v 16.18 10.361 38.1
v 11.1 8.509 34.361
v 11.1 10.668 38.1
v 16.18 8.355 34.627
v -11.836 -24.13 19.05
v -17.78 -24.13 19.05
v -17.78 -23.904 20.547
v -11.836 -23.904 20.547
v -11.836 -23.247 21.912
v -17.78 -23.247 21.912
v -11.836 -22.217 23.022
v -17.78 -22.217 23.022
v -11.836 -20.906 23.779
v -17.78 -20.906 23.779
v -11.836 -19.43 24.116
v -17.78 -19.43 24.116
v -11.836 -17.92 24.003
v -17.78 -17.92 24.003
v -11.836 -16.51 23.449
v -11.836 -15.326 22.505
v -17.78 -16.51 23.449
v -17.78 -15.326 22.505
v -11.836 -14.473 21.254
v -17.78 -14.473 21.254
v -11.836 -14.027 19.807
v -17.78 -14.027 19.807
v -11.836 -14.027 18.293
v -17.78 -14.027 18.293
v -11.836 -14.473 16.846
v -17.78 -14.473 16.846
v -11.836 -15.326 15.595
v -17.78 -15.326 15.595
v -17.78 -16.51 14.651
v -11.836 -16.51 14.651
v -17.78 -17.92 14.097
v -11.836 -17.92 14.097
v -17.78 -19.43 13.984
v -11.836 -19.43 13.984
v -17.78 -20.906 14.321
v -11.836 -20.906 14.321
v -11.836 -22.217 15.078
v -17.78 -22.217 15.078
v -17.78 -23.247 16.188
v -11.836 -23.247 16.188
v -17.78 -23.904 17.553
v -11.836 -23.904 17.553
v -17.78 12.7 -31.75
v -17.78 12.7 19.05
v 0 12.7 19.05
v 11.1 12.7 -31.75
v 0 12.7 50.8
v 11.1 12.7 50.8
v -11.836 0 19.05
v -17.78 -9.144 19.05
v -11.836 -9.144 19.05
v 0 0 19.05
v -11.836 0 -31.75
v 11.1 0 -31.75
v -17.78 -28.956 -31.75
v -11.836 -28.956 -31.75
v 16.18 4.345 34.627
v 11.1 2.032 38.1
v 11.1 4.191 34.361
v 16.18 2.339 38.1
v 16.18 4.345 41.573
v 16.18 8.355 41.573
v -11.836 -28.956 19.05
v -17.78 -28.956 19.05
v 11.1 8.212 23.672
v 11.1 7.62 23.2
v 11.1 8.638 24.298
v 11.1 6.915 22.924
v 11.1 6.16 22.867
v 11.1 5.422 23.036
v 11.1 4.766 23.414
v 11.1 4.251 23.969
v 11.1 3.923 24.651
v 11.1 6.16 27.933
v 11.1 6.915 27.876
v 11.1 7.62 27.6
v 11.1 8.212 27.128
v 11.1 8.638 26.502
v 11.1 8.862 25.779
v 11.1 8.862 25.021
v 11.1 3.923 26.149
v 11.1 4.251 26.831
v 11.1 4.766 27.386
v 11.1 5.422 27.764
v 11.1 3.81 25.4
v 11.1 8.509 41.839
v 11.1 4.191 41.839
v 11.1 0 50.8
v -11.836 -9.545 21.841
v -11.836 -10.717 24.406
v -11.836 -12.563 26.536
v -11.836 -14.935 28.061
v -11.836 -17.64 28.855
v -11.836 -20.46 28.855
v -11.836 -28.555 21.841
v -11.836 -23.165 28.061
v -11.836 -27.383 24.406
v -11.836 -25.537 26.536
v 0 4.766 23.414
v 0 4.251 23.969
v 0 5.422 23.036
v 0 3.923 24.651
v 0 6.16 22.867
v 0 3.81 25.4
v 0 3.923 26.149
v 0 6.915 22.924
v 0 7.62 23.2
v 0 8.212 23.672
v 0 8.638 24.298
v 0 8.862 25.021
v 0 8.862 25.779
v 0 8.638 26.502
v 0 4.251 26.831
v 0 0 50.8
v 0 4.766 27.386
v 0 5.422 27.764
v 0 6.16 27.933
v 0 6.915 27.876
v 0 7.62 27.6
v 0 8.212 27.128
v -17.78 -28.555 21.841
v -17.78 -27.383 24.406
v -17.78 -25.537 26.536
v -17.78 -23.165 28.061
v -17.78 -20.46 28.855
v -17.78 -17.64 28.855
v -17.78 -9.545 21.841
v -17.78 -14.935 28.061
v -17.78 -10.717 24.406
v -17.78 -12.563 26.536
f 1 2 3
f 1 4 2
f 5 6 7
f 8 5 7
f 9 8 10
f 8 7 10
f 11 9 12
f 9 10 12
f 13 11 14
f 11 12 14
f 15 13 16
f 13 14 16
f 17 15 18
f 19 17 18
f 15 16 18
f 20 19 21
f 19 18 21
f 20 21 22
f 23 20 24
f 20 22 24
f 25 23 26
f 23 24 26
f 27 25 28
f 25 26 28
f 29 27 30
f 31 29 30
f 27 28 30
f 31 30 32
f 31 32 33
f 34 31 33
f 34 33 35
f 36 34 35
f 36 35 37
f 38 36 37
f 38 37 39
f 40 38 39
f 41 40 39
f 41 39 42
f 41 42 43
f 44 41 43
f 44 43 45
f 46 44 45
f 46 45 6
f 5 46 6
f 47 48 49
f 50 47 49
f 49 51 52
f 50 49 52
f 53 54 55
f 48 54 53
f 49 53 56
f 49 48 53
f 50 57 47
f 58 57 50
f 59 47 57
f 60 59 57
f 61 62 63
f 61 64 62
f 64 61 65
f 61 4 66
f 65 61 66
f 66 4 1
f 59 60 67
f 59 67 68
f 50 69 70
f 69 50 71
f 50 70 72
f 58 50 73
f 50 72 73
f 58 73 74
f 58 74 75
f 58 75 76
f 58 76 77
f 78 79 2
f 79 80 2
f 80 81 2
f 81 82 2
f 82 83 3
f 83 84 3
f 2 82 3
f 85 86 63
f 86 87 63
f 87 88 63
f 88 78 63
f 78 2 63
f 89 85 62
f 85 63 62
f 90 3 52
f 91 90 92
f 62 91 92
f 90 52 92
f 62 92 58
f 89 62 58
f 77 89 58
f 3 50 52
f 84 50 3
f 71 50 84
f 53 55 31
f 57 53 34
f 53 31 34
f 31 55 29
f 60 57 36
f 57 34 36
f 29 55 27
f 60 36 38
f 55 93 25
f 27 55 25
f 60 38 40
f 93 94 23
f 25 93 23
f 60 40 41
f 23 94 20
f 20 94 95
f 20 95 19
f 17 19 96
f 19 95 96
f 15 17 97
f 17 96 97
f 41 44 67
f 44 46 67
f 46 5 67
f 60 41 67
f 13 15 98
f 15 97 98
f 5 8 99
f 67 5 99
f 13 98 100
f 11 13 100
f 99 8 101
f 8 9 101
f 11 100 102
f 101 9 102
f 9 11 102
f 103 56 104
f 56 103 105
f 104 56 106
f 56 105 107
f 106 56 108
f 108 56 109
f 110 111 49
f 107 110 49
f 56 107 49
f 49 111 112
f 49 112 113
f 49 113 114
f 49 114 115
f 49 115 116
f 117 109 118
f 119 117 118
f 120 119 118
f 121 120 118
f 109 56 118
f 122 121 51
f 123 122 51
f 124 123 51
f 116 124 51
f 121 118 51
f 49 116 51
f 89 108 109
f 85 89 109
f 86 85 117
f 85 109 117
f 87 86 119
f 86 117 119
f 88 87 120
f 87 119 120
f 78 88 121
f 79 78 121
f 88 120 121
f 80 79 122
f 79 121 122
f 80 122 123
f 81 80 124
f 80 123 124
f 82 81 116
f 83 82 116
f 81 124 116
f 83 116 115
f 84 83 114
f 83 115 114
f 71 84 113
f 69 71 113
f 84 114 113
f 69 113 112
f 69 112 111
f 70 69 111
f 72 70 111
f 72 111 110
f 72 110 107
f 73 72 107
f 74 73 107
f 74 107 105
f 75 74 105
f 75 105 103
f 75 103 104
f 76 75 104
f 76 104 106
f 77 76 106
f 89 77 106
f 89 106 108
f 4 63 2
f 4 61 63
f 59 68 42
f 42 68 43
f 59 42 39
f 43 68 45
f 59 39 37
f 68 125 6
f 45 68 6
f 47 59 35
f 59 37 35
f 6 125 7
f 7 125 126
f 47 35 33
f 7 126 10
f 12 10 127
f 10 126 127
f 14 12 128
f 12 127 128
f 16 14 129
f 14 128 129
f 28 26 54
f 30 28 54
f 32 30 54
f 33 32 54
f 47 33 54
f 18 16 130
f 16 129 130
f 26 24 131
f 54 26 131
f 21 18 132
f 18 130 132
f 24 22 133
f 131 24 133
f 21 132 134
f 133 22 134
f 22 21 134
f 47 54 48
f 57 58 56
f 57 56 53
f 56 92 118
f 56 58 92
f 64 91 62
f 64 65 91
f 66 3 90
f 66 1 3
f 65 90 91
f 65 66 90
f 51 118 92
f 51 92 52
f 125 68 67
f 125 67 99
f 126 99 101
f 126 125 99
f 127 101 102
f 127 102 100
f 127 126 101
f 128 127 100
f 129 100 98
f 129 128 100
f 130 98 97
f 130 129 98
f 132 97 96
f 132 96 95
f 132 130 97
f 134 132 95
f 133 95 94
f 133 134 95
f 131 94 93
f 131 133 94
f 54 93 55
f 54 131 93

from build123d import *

# Parameters (mm, degrees)
F0_W      = 12.7
F0_H      = 50.8
F1_DEPTH  = 11.0998
F3_DEPTH  = 5.08
F3_TAPER  = 3
F4_R      = 2.54
F5_DEPTH  = 16.1808001
F6_W      = 12.7
F6_H      = 19.05
F7_DEPTH  = 17.78
F8_W      = 5.9436
F8_H      = 19.05
F9_DEPTH  = 25.4
F10_W     = 5.9436
F10_H     = 12.7
F11_DEPTH = 6.35
F12_R     = 6.34999
F13_R     = 5.08
F14_DEPTH = 33.9608001
F16_DEPTH = 5.9436
F18_DEPTH = 31.75


# Not quite as in the source:
# - a fillet or chamfer is up to 0.001 mm smaller than in the source, because OpenCascade refuses the exact size


with BuildPart() as f1:
    # F0 (on Right) → F1 (new body)
    with BuildSketch(Plane.YZ):
        with Locations((6.35, 25.4)):
            Rectangle(F0_W, F0_H)
    extrude(amount=F1_DEPTH)

    # F2 (on face) → F3 (join)
    with BuildSketch(Plane.YZ.offset(11.0998)):
        Polygon((4.191, 34.3605023065), (8.509, 34.3605023065), (10.668, 38.1), (8.509, 41.8394976935), (4.191, 41.8394976935), (2.032, 38.1), align=None)
    extrude(amount=F3_DEPTH, taper=F3_TAPER)

    # F4 (on face) → F5 (cut, through all)
    with BuildSketch(Plane(origin=(0, 0, 0), x_dir=(0, -1, 0), z_dir=(-1, 0, 0))):
        with Locations((-6.35, 25.4)):
            Circle(F4_R)
    extrude(amount=-F5_DEPTH, mode=Mode.SUBTRACT)

    # F6 (on face) → F7 (join)
    with BuildSketch(Plane(origin=(0, 0, 0), x_dir=(0, -1, 0), z_dir=(-1, 0, 0))):
        with Locations((-6.35, 9.525)):
            Rectangle(F6_W, F6_H)
    extrude(amount=F7_DEPTH)

    # F8 (on face) → F9 (join)
    with BuildSketch(Plane.XZ):
        with Locations((-14.8082, 9.525)):
            Rectangle(F8_W, F8_H)
    extrude(amount=F9_DEPTH)

    # F10 (on face) → F11 (join)
    with BuildSketch(Plane.XY.offset(19.05)):
        with Locations((-14.8082, -19.05)):
            Rectangle(F10_W, F10_H)
    extrude(amount=F11_DEPTH)

    # F12 (radius 6.35 in the source; OpenCascade refuses exactly that, so slightly less here)
    f12_edges = [f1.edges().sort_by_distance(p)[0] for p in [
        (-14.8082, -12.7, 25.4),
        (-14.8082, -25.4, 25.4),
    ]]
    fillet(f12_edges, radius=F12_R)

    # F13 (on face) → F14 (cut, through all)
    with BuildSketch(Plane(origin=(-17.78, 0, 0), x_dir=(0, -1, 0), z_dir=(-1, 0, 0))):
        with Locations((19.05, 19.05)):
            Circle(F13_R)
    extrude(amount=-F14_DEPTH, mode=Mode.SUBTRACT)

    # F15 (on face) → F16 (join, through all)
    with BuildSketch(Plane(origin=(-17.78, 0, 0), x_dir=(0, -1, 0), z_dir=(-1, 0, 0))):
        with BuildLine():
            Line((28.956, 0), (28.956, 19.05))
            ThreePointArc((28.956, 19.05), (19.05, 28.956), (9.144, 19.05))
            Line((9.144, 19.05), (12.7, 19.05))
            ThreePointArc((12.7, 19.05), (19.05, 25.4), (25.4, 19.05))
            Line((25.4, 19.05), (25.4, 0))
            Line((25.4, 0), (28.956, 0))
        make_face()
    extrude(amount=-F16_DEPTH)

    # F17 (on face) → F18 (join)
    with BuildSketch(Plane(origin=(0, 0, 0), x_dir=(1, 0, 0), z_dir=(0, 0, -1))):
        Polygon((-17.78, -12.7), (11.0998, -12.7), (11.0998, 0), (-11.8364, 0), (-11.8364, 28.956), (-17.78, 28.956), align=None)
    extrude(amount=F18_DEPTH)


solid = f1.part
